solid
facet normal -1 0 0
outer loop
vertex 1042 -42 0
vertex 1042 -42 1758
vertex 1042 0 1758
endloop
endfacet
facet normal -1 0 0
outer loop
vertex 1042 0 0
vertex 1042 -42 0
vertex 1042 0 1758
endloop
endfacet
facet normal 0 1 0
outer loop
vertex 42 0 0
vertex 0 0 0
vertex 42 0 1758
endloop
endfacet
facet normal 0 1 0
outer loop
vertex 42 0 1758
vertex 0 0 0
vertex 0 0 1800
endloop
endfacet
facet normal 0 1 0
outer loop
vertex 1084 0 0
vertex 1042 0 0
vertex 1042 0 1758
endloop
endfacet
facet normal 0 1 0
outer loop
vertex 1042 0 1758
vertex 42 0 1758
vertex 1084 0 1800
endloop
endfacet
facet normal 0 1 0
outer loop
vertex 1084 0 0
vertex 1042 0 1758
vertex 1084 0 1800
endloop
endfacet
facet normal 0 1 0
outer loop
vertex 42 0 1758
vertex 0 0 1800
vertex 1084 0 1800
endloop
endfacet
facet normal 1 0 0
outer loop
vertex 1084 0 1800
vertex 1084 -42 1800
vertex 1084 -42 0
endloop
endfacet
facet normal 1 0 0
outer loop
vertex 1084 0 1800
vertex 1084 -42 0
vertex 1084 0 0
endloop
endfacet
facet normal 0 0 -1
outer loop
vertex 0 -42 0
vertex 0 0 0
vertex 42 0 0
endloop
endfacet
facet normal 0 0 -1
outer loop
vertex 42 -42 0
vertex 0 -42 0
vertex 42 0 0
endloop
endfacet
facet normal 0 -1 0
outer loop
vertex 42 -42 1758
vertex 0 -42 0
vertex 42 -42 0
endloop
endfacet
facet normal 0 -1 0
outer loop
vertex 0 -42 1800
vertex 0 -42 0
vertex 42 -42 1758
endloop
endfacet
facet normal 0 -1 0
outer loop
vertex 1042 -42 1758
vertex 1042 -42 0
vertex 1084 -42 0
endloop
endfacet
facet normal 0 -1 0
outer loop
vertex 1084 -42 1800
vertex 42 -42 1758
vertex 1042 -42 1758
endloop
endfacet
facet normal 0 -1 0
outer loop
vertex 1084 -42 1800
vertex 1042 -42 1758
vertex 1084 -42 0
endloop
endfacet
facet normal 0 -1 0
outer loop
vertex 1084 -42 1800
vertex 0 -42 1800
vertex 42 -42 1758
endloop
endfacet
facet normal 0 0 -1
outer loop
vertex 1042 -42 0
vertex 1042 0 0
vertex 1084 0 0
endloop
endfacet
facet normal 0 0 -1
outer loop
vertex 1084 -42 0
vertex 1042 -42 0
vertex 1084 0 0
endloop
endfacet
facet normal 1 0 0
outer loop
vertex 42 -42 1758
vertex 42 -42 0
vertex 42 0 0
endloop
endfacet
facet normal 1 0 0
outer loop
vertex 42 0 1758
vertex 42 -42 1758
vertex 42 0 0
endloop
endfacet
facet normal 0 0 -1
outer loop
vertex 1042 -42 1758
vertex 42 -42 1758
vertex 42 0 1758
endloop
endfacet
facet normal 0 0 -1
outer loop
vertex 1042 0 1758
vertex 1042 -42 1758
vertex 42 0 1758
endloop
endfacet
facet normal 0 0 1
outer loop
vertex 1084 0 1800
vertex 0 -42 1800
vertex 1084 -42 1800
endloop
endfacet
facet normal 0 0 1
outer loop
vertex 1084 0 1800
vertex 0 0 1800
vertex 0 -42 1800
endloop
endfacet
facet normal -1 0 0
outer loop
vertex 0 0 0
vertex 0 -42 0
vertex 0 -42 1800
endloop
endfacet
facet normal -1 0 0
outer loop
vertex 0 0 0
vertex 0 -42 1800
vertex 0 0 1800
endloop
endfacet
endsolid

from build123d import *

# Parameters (mm, degrees)
F0_W     = 42
F0_H     = 42
F1_DEPTH = 1800
F2_W     = 42
F2_H     = 42
F3_DEPTH = 1000
F4_W     = 42
F4_H     = 42
F5_DEPTH = 1800


with BuildPart() as f1:
    # F0 (on Top) → F1 (new body)
    with BuildSketch(Plane.XY):
        with Locations((21, -21)):
            Rectangle(F0_W, F0_H)
    extrude(amount=F1_DEPTH)

    # F2 (on face) → F3 (join)
    with BuildSketch(Plane.YZ.offset(42)):
        with Locations((-21, 1779)):
            Rectangle(F2_W, F2_H)
    extrude(amount=F3_DEPTH)

    # F4 (on face) → F5 (join)
    with BuildSketch(Plane.XY.offset(1800)):
        with Locations((1063, -21)):
            Rectangle(F4_W, F4_H)
    extrude(amount=-F5_DEPTH)


solid = f1.part
